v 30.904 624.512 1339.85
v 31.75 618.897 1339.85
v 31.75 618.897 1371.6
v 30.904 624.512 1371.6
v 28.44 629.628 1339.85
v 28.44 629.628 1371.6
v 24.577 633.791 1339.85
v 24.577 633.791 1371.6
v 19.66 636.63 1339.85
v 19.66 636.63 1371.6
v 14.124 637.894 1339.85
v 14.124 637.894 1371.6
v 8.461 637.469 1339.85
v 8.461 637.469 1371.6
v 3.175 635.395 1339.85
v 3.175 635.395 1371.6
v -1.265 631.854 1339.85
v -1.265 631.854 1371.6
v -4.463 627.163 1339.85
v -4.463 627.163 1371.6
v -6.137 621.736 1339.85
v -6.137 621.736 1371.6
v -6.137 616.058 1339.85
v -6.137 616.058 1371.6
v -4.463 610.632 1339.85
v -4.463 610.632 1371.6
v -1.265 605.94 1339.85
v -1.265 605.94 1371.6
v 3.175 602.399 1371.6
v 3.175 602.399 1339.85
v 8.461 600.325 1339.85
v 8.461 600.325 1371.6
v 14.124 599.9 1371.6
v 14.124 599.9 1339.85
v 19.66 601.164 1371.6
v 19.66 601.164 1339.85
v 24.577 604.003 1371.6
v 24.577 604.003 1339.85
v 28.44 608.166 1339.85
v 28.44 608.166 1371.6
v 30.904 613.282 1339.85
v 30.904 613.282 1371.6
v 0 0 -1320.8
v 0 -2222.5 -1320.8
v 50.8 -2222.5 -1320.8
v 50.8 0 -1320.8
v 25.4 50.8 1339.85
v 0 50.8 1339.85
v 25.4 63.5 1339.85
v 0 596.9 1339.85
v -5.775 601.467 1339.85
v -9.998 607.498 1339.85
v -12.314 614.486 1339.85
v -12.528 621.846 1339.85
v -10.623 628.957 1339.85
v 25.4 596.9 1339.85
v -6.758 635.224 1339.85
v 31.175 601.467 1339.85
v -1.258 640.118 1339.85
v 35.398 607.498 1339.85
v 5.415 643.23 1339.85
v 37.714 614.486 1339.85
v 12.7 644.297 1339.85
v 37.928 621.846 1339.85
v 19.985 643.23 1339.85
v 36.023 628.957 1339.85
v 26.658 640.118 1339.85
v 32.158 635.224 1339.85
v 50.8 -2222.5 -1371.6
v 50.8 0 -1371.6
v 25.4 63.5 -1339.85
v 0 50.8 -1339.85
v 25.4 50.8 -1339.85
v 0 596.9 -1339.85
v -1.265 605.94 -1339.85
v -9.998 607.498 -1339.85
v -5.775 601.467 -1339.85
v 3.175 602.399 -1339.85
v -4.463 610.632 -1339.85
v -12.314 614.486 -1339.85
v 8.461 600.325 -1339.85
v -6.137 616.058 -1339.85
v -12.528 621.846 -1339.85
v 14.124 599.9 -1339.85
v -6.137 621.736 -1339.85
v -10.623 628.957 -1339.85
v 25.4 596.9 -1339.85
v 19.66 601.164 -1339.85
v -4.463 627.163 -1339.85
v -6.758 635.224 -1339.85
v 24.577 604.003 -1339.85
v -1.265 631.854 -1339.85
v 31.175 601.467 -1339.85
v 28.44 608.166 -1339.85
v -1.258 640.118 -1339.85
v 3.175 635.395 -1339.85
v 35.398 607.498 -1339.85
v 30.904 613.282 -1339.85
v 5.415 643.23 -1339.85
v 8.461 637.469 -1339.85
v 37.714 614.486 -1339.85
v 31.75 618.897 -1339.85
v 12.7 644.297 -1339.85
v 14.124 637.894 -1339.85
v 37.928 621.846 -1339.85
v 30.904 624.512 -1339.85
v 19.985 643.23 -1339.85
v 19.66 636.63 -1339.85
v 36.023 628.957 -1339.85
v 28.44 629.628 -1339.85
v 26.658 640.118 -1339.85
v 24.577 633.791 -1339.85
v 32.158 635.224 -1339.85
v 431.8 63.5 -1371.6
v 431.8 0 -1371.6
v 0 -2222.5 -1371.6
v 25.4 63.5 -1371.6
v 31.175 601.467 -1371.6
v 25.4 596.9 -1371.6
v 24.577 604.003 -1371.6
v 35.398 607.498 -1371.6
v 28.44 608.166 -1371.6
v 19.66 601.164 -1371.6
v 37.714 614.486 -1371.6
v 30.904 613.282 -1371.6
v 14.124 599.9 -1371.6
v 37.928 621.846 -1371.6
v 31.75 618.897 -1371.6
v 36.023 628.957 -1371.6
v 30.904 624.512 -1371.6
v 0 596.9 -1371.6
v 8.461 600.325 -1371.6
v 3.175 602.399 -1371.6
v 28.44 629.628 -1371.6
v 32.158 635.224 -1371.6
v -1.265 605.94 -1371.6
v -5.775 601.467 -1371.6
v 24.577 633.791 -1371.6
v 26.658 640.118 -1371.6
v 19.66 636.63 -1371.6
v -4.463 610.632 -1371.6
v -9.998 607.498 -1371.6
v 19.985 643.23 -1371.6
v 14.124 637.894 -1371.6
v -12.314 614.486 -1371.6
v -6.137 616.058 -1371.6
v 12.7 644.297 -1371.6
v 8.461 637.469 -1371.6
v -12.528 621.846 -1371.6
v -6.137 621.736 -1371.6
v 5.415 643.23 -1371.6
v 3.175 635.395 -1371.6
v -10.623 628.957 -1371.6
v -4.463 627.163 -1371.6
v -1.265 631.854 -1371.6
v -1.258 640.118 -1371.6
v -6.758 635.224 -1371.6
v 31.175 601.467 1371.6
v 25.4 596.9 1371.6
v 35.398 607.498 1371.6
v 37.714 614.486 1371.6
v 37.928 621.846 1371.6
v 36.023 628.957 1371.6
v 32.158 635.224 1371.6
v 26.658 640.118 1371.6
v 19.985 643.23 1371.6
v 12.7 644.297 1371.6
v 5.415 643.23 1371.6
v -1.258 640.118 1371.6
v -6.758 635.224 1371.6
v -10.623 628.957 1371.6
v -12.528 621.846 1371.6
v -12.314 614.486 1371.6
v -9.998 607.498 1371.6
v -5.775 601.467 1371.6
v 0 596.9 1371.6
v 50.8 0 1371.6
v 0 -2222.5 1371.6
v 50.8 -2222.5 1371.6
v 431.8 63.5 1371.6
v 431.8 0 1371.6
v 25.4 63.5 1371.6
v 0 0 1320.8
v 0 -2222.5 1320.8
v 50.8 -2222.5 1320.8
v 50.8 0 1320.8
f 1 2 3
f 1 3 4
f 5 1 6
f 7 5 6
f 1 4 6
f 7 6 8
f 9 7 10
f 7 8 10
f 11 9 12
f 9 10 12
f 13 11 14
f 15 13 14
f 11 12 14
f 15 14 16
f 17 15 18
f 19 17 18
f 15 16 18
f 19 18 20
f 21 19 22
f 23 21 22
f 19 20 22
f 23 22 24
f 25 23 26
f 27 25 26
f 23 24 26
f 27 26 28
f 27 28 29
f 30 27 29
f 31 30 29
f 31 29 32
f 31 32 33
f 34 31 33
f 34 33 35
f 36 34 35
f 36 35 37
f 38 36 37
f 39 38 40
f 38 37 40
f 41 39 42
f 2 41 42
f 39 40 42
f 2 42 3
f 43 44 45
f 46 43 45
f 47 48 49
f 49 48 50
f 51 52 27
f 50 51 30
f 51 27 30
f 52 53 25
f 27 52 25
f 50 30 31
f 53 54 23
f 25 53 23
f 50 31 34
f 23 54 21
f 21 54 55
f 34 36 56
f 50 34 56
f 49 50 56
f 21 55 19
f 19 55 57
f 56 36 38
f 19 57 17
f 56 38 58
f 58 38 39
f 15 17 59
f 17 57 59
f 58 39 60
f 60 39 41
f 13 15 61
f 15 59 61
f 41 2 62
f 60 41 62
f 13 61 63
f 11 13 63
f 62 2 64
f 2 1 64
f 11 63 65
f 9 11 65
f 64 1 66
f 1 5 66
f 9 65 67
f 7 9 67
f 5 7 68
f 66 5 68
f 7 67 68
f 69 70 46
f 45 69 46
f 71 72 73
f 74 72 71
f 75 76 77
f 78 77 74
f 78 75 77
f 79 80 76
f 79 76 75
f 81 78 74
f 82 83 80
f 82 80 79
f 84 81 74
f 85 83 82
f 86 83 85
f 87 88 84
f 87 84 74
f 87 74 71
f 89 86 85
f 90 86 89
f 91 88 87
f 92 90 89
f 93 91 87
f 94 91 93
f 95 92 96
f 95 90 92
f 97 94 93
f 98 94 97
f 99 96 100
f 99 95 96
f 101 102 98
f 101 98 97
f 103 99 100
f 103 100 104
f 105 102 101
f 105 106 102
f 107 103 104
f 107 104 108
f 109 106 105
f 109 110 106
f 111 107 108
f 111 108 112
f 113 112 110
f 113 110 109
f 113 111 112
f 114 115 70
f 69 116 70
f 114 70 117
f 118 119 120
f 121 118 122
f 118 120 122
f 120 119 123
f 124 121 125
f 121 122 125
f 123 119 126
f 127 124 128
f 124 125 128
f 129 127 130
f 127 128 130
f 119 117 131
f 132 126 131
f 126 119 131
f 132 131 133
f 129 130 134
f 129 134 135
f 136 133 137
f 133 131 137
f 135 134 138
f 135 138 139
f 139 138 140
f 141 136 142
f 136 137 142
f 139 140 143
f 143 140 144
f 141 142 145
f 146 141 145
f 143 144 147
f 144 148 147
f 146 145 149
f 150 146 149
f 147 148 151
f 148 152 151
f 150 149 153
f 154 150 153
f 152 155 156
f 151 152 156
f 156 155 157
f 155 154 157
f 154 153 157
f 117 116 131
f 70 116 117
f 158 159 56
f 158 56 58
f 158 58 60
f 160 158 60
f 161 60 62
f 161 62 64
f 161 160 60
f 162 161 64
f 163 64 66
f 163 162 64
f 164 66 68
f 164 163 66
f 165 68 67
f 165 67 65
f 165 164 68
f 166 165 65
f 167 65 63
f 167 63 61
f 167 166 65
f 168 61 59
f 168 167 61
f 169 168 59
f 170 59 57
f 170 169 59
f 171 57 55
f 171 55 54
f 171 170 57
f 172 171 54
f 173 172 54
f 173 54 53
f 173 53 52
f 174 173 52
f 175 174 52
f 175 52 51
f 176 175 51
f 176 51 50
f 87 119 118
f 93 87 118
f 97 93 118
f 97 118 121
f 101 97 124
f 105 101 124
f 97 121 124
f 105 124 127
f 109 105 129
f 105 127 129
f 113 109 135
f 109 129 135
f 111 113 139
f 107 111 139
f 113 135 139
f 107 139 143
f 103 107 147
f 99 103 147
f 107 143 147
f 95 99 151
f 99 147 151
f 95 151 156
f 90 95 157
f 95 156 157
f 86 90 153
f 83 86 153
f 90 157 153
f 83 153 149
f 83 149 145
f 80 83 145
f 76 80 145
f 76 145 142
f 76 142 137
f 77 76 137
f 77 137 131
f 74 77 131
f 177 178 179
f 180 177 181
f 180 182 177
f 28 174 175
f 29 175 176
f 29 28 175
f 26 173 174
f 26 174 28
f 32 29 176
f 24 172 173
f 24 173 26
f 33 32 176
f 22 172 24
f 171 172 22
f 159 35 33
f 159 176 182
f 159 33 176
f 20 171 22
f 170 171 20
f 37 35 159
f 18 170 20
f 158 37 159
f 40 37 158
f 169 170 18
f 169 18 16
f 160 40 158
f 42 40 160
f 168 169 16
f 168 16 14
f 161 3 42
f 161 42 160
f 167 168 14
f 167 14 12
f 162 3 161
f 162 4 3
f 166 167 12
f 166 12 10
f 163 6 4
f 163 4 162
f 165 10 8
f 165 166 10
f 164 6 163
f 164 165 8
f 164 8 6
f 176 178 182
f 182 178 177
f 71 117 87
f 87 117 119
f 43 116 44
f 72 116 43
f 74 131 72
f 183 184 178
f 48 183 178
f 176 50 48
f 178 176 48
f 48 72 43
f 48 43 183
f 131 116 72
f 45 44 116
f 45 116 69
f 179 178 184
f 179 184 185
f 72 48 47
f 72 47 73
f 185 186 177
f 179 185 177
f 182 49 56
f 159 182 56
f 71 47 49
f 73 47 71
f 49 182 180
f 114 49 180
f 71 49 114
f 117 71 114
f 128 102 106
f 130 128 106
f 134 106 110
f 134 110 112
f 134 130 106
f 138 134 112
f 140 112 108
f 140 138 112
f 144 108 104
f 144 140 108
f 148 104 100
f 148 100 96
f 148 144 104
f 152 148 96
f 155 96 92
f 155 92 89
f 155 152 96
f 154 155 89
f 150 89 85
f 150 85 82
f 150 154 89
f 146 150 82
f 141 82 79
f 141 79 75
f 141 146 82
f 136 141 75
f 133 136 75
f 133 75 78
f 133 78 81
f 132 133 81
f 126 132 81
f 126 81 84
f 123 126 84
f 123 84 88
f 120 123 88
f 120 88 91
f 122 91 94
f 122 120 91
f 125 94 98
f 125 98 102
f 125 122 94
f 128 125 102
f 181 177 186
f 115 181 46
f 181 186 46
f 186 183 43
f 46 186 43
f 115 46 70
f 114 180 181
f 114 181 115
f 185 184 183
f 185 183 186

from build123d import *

# Parameters (mm, degrees)
SKETCH1_W               = 50.8
SKETCH1_H               = 2743.2
BOSS_EXTRUDE1_DEPTH     = 50.8
SKETCH2_R               = 19.05
BOSS_EXTRUDE2_DEPTH     = 31.75
SKETCH3_W               = 2743.2
SKETCH3_H               = 50.8
BOSS_EXTRUDE3_DEPTH     = 279.4
SKETCH4_W               = 279.4
SKETCH4_H               = 2743.2
BOSS_EXTRUDE4_DEPTH     = 12.7
SKETCH9_W               = 2743.2
SKETCH9_H               = 63.5
BOSS_EXTRUDE8_DEPTH     = 127
CUT_EXTRUDE1_DEPTH      = 2851.739581675
CUT_EXTRUDE1_DEPTH_BACK = 2851.739581675
SKETCH10_W              = 25.4
SKETCH10_H              = 50.8
SKETCH11_W              = 50.8
SKETCH11_H              = 50.8
BOSS_EXTRUDE9_DEPTH     = 2222.5


with BuildPart() as part:
    # Sketch1 → Boss-Extrude1 (new body)
    with BuildSketch(Plane(origin=(0, 0, 0), x_dir=(1, 0, 0), z_dir=(0, 1, 0))):
        Rectangle(SKETCH1_W, SKETCH1_H)
    extrude(amount=BOSS_EXTRUDE1_DEPTH)

    # Sketch2 → Boss-Extrude2 (add)
    with BuildSketch(Plane.XY.offset(1371.6)):
        with BuildLine():
            Line((0, 50.8), (25.4, 50.8))
            Line((25.4, 50.8), (25.4, 596.9))
            ThreePointArc((25.4, 596.9), (12.7, 644.297045256), (0, 596.9))
            Line((0, 596.9), (0, 50.8))
        make_face()
        with Locations((12.7, 618.897045256)):
            Circle(SKETCH2_R, mode=Mode.SUBTRACT)
    boss_extrude2 = extrude(amount=-BOSS_EXTRUDE2_DEPTH)

    # Mirror1: Boss-Extrude2 across plane
    add(boss_extrude2.mirror(Plane.XY))

    # Sketch3 → Boss-Extrude3 (add)
    with BuildSketch(Plane(origin=(25.4, 0, 0), x_dir=(0, 0, -1), z_dir=(1, 0, 0))):
        with Locations((0, 25.4)):
            Rectangle(SKETCH3_W, SKETCH3_H)
    extrude(amount=BOSS_EXTRUDE3_DEPTH)

    # Sketch4 → Boss-Extrude4 (add)
    with BuildSketch(Plane(origin=(0, 50.8, 0), x_dir=(1, 0, 0), z_dir=(0, 1, 0))):
        with Locations((165.1, 0)):
            Rectangle(SKETCH4_W, SKETCH4_H)
    extrude(amount=BOSS_EXTRUDE4_DEPTH)

    # Sketch9 → Boss-Extrude8 (add)
    with BuildSketch(Plane(origin=(304.8, 0, 0), x_dir=(0, 0, -1), z_dir=(1, 0, 0))):
        with Locations((0, 31.75)):
            Rectangle(SKETCH9_W, SKETCH9_H)
    extrude(amount=BOSS_EXTRUDE8_DEPTH)

    # Sketch10 → Cut-Extrude1 (cut, two sides: drawn at the far end of the back side and taken through both)
    with BuildSketch(Plane.XY.offset(1371.6).offset(-CUT_EXTRUDE1_DEPTH_BACK)):
        with Locations((-12.7, 25.4)):
            Rectangle(SKETCH10_W, SKETCH10_H)
    extrude(amount=CUT_EXTRUDE1_DEPTH + CUT_EXTRUDE1_DEPTH_BACK, mode=Mode.SUBTRACT)

    # Sketch11 → Boss-Extrude9 (add)
    with BuildSketch(Plane.XZ):
        with Locations((25.4, 1346.2)):
            Rectangle(SKETCH11_W, SKETCH11_H)
        with Locations((25.4, -1346.2)):
            Rectangle(SKETCH11_W, SKETCH11_H)
    extrude(amount=BOSS_EXTRUDE9_DEPTH)


solid = part.part
